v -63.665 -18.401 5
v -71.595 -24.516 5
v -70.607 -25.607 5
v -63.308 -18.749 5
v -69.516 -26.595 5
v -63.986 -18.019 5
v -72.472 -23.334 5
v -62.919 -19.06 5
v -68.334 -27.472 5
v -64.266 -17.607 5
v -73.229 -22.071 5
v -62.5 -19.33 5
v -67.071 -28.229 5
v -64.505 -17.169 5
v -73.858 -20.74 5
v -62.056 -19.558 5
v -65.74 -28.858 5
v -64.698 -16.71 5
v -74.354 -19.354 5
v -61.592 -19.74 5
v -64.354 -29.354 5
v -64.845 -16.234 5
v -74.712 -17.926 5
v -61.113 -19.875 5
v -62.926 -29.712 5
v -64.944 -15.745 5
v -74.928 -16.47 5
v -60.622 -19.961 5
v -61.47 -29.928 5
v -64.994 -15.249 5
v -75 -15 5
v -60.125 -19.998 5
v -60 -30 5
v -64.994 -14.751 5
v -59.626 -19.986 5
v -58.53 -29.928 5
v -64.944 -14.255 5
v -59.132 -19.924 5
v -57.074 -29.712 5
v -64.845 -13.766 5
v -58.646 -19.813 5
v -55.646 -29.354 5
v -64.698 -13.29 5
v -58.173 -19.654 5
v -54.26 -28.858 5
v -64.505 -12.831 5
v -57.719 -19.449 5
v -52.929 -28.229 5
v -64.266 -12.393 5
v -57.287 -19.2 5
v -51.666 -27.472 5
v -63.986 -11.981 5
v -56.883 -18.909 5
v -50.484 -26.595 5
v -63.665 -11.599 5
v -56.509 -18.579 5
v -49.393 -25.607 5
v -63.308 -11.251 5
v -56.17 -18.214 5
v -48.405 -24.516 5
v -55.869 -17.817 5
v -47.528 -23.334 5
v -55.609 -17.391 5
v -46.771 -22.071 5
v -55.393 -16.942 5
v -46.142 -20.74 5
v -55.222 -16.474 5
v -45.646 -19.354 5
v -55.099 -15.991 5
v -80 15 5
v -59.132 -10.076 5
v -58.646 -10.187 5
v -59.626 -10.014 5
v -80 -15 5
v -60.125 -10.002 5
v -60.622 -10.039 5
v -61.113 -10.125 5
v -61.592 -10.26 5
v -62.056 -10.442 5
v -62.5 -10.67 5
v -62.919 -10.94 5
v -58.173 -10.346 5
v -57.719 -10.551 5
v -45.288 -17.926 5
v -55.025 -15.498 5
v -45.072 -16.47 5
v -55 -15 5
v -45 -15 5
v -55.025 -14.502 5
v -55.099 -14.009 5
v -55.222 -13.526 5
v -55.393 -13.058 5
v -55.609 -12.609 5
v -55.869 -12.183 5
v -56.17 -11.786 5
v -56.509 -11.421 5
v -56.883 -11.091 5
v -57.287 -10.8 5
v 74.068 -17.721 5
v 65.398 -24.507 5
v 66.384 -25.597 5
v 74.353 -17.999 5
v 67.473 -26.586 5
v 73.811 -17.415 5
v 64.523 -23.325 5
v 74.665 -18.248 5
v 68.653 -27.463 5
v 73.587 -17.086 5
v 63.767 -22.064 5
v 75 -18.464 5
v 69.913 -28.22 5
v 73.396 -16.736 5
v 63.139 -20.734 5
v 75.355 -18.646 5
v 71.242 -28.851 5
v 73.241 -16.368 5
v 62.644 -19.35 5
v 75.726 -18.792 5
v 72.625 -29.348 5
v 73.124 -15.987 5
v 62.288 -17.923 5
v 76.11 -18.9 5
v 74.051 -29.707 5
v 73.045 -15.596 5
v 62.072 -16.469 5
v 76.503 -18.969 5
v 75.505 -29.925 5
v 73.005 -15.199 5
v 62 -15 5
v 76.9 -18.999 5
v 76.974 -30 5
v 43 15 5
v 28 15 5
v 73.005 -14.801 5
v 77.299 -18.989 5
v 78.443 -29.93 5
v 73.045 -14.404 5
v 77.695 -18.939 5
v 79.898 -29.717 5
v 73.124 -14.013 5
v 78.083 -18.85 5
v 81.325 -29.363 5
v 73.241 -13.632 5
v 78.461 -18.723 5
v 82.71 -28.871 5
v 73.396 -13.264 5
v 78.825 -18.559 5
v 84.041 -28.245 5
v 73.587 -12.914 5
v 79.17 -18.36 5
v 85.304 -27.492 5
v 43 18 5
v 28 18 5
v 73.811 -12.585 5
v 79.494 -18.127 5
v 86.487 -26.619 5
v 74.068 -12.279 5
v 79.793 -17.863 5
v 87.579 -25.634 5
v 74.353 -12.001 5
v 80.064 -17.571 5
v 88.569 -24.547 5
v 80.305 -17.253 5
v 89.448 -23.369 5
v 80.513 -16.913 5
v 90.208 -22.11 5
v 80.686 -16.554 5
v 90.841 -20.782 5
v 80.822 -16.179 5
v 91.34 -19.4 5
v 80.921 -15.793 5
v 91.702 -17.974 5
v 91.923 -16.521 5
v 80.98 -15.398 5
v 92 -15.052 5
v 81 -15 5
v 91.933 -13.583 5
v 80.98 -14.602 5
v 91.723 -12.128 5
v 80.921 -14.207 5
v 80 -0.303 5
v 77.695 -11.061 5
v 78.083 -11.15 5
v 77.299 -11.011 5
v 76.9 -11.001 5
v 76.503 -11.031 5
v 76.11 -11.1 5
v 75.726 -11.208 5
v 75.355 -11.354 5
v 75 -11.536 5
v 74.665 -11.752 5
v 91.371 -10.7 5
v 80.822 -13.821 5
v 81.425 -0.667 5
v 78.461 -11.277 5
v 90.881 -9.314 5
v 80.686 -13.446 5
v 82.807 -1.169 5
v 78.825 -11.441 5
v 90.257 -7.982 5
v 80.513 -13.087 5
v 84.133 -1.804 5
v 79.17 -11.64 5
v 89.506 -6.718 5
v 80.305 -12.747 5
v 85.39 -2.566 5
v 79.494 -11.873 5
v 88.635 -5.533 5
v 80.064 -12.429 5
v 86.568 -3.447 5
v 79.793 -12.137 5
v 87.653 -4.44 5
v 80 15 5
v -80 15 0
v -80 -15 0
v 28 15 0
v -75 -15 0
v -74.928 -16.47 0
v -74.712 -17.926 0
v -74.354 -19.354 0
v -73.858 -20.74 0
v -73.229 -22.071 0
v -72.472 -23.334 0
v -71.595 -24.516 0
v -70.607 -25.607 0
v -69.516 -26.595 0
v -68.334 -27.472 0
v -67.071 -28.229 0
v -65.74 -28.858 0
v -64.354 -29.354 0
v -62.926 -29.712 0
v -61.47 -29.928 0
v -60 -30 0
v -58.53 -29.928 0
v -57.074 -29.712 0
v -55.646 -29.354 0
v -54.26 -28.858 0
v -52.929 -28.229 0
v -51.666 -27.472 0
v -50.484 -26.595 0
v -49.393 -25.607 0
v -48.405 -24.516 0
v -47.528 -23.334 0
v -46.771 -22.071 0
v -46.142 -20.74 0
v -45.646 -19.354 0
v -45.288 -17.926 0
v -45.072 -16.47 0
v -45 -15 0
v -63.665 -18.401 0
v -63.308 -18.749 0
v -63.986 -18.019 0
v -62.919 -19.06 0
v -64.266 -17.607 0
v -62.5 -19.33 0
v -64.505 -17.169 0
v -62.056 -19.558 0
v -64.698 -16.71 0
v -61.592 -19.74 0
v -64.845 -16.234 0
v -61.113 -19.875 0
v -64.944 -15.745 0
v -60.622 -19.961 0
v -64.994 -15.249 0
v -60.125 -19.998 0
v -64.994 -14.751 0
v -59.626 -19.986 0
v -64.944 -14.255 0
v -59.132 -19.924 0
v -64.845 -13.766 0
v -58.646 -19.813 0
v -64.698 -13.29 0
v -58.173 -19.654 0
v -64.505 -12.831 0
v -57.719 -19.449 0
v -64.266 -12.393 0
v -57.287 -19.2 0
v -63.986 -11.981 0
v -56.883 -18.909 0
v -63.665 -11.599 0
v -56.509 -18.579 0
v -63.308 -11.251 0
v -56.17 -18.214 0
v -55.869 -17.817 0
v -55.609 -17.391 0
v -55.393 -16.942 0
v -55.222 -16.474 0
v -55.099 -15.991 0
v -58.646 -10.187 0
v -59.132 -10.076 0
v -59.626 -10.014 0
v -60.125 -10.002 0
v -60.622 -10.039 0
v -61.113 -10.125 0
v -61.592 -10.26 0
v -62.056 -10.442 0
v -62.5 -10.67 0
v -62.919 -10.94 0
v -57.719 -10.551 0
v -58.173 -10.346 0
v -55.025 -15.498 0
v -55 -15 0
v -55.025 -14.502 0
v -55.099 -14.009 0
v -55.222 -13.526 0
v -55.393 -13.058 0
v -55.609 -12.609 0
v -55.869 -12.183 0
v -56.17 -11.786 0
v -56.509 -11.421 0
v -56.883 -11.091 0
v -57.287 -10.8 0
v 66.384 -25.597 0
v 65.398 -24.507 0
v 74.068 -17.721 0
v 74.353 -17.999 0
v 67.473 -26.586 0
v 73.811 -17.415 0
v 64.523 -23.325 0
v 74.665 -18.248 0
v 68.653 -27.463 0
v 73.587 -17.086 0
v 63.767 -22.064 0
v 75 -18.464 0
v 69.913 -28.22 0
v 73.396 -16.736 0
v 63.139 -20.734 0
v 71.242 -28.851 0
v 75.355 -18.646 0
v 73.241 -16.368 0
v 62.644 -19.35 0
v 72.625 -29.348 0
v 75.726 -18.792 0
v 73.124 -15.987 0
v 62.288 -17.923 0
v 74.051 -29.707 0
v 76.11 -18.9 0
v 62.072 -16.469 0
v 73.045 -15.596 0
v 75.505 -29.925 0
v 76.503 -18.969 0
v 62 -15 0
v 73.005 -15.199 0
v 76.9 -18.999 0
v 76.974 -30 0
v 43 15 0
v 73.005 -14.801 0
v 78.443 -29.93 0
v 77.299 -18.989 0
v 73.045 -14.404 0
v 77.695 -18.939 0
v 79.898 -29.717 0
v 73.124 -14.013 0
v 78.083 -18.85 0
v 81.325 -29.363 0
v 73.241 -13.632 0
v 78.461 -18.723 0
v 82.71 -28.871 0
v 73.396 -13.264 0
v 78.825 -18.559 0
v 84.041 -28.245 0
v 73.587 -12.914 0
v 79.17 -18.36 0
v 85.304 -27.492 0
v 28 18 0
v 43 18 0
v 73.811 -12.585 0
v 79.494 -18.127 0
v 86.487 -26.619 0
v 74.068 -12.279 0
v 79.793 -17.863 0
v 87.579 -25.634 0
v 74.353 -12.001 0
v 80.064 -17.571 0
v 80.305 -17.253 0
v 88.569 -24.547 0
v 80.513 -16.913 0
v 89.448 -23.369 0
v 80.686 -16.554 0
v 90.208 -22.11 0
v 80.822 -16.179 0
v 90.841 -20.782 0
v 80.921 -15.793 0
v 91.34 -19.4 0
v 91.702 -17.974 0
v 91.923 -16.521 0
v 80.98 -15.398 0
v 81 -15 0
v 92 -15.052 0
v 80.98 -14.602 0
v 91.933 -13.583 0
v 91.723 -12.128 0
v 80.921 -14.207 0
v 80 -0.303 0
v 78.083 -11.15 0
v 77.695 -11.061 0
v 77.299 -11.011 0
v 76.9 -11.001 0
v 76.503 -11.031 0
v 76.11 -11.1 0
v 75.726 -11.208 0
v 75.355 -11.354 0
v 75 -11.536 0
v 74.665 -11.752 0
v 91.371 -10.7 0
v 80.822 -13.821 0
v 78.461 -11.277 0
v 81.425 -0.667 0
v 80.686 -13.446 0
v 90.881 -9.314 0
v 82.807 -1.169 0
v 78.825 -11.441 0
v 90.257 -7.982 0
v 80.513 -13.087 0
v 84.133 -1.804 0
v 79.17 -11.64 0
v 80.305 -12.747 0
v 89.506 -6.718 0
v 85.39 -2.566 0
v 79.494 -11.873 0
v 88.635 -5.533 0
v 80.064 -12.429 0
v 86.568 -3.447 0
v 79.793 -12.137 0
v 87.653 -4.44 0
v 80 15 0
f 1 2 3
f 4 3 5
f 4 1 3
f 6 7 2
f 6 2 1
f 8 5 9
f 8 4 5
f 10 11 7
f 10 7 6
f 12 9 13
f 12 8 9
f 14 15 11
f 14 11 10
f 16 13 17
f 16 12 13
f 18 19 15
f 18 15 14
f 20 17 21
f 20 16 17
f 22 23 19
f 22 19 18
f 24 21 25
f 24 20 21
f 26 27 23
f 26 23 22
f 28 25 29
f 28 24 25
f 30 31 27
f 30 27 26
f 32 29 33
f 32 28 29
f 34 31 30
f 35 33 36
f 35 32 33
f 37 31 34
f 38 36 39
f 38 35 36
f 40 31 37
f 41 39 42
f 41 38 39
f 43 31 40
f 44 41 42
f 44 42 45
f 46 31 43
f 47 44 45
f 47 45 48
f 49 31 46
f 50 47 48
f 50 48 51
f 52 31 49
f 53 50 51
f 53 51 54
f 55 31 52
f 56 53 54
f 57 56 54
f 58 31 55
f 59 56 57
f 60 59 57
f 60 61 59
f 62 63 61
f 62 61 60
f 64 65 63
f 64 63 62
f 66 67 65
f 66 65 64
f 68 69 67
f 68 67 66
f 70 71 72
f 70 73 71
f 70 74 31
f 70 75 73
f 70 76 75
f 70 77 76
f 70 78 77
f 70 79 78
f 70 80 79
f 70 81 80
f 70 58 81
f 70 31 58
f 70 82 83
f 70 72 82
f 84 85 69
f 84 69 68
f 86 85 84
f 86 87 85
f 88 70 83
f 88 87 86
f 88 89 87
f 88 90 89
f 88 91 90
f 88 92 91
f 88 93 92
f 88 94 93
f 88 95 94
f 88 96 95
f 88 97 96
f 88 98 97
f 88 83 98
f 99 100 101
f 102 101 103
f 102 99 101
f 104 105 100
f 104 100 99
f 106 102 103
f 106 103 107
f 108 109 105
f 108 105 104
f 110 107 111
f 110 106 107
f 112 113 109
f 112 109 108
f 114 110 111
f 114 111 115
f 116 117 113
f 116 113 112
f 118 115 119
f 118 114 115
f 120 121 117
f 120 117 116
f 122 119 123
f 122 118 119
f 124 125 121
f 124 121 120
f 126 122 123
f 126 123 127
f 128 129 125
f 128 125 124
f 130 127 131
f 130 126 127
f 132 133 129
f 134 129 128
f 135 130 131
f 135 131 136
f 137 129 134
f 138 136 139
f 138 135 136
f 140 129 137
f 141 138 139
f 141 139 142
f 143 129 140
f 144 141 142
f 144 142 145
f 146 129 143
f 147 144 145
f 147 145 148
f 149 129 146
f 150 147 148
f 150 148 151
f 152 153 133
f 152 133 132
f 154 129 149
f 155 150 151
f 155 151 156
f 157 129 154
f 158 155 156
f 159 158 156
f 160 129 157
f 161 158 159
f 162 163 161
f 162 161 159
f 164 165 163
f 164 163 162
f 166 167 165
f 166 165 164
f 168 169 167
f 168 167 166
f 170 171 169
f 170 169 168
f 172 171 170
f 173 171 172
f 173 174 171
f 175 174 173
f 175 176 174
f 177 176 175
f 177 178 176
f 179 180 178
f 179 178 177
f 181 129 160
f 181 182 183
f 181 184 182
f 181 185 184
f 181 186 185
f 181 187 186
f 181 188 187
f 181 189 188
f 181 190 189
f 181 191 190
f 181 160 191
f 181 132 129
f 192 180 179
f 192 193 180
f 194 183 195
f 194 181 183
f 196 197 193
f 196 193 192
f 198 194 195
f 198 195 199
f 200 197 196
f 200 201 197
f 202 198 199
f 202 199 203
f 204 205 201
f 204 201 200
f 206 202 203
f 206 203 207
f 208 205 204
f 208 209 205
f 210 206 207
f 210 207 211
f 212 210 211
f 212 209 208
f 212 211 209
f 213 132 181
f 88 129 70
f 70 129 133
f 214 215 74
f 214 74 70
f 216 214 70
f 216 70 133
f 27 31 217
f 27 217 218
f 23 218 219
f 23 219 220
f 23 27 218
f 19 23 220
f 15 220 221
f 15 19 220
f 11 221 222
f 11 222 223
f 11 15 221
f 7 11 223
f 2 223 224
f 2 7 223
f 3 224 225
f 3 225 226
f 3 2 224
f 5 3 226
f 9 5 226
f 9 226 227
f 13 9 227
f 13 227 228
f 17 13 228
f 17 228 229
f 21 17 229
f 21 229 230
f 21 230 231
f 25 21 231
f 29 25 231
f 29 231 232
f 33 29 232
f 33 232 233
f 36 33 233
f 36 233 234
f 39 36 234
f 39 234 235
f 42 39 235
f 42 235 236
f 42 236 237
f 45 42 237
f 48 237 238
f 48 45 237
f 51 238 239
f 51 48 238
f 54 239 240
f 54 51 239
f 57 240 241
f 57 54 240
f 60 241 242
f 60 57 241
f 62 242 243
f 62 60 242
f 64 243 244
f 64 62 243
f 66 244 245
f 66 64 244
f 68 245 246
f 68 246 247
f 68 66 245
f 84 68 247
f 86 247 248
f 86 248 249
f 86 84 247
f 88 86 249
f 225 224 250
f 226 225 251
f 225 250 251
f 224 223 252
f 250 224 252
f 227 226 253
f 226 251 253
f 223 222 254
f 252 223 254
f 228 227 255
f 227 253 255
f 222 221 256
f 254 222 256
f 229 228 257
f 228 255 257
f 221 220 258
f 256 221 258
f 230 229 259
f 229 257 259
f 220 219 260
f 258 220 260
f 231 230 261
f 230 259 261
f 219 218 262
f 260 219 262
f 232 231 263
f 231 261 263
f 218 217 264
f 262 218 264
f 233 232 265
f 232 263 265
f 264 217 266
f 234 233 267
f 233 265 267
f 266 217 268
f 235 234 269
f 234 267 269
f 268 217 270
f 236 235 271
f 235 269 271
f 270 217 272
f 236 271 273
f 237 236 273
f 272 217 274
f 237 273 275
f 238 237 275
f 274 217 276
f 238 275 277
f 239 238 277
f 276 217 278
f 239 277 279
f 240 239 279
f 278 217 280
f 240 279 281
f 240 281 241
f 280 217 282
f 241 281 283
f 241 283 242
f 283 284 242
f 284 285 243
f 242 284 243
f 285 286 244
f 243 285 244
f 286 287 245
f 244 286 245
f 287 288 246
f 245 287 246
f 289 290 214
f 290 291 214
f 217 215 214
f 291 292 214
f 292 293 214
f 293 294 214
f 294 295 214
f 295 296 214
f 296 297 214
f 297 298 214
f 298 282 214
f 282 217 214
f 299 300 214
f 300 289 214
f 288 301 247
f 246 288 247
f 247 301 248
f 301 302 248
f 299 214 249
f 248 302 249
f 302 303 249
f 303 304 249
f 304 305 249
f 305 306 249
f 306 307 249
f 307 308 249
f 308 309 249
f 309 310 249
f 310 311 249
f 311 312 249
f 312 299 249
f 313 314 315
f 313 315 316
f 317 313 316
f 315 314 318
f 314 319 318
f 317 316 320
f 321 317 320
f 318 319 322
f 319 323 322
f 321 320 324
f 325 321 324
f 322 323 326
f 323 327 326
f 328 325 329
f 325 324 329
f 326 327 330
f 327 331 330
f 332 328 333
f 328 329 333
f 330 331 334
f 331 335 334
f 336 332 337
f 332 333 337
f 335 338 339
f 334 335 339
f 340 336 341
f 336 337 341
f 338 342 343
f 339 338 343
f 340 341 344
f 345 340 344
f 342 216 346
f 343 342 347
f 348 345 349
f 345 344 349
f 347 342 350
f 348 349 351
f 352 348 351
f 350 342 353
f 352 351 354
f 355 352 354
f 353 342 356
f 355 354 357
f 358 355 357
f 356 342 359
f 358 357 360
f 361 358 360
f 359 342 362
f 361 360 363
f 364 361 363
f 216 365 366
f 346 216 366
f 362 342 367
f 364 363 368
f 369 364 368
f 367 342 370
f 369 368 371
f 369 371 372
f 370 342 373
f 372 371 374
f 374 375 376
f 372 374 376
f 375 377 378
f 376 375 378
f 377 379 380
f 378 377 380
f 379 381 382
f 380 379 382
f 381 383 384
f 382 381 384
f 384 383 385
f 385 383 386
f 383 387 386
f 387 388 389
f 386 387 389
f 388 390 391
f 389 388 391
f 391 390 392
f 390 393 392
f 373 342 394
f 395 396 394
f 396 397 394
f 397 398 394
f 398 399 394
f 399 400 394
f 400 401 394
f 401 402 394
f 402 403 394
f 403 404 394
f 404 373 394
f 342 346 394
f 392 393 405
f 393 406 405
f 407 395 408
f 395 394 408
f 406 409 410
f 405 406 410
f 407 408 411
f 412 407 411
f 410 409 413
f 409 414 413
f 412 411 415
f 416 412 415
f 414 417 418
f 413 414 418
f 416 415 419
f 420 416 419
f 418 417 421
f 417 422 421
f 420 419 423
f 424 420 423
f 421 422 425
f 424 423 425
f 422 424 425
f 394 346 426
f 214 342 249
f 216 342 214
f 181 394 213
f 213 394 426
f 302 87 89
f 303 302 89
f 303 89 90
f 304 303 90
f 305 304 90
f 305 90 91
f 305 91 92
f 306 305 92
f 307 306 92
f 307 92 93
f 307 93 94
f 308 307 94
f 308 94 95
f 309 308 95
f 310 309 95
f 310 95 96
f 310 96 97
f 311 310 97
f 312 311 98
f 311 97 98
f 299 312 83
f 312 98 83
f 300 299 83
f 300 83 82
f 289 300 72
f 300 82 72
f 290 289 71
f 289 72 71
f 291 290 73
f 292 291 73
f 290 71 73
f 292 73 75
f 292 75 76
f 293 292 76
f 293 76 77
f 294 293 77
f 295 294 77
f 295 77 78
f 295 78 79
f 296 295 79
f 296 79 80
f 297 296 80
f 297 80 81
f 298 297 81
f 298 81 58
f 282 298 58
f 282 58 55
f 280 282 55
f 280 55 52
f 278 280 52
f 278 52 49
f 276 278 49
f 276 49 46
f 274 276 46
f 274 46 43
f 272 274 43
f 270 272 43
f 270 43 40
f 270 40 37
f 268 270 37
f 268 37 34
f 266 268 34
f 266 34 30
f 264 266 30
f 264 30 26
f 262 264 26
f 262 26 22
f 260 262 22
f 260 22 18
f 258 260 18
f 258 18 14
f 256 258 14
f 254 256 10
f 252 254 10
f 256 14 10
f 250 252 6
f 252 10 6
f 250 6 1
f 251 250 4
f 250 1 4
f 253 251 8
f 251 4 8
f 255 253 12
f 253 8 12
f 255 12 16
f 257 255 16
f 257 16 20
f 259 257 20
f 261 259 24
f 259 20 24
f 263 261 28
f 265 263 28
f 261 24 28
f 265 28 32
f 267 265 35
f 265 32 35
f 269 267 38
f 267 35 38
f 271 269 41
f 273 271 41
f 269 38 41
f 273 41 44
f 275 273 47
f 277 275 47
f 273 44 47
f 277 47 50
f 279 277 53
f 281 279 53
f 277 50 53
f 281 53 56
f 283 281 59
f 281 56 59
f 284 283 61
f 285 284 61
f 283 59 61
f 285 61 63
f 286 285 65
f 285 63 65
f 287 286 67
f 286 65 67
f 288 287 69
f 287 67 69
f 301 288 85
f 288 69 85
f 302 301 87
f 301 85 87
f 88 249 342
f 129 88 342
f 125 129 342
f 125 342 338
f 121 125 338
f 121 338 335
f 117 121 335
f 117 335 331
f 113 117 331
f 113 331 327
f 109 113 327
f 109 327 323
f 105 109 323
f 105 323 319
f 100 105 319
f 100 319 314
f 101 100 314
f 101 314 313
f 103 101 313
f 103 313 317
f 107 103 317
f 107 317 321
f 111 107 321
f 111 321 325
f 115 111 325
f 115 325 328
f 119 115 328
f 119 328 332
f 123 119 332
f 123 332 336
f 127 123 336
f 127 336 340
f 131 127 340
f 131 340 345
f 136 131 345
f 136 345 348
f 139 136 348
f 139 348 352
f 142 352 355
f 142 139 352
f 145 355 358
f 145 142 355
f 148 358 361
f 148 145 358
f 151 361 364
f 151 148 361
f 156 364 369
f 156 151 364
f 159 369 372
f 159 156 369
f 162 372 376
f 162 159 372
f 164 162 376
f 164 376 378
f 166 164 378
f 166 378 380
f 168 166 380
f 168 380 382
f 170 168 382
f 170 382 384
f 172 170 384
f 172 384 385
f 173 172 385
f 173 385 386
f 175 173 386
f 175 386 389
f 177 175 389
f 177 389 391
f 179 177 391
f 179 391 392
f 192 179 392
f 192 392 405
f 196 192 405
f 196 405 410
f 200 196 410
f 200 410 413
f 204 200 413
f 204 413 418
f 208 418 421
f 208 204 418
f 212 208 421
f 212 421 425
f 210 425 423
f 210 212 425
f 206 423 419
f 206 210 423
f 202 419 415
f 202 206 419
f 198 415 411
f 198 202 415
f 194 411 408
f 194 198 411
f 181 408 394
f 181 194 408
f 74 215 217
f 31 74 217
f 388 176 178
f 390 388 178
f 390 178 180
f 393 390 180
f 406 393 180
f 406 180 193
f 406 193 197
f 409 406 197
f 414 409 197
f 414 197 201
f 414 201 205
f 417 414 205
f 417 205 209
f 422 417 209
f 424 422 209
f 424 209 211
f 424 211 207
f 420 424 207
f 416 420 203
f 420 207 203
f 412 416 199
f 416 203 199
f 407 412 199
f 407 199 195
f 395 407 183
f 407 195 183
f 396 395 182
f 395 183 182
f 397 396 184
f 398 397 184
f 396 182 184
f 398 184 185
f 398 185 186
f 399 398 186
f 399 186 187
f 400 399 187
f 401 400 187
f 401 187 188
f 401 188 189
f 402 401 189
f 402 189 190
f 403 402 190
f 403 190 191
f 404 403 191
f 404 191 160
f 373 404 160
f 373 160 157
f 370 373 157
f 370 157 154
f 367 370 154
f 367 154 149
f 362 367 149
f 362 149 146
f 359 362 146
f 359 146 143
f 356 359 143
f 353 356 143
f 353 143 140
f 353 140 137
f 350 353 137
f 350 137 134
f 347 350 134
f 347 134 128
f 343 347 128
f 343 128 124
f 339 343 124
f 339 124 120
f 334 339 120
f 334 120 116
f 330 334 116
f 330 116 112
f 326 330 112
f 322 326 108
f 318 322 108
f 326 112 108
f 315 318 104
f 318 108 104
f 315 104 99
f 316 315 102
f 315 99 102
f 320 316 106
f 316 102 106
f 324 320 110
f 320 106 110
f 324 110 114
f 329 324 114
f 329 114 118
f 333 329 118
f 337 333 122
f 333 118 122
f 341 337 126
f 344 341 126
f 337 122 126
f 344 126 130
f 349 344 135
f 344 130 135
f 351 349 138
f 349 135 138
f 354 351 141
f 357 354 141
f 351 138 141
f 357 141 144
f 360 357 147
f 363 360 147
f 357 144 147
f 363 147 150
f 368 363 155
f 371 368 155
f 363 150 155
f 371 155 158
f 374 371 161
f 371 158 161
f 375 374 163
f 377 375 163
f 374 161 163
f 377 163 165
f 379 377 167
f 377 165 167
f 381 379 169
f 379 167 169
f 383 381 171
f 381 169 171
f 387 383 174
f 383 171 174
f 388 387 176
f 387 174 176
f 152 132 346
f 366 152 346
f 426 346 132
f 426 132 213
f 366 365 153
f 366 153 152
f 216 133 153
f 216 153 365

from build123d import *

# Parameters (mm, degrees)
SKETCH_1_W          = 160
SKETCH_1_H          = 30
EXTRUDE_1_DEPTH     = 5
SKETCH_2_R          = 15
EXTRUDE_2_DEPTH     = 5
SKETCH_3_R          = 5
SKETCH_3_R_2        = 4
CUT_EXTRUDE_1_DEPTH = 6
SKETCH_4_W          = 15
SKETCH_4_H          = 5
EXTRUDE_3_DEPTH     = 3


with BuildPart() as part:
    # 草图1 → 凸台-拉伸1 (new body)
    with BuildSketch(Plane.XY):
        Rectangle(SKETCH_1_W, SKETCH_1_H)
    extrude(amount=EXTRUDE_1_DEPTH)

    # 草图2 → 凸台-拉伸2 (add)
    with BuildSketch(Plane.XY.offset(5)):
        with Locations((-60, -15)):
            Circle(SKETCH_2_R)
        with Locations((77, -15)):
            Circle(SKETCH_2_R)
    extrude(amount=-EXTRUDE_2_DEPTH)

    # 草图3 → 切除-拉伸1 (cut, through all)
    with BuildSketch(Plane.XY.offset(5)):
        with Locations((-60, -15)):
            Circle(SKETCH_3_R)
        with Locations((77, -15)):
            Circle(SKETCH_3_R_2)
    extrude(amount=-CUT_EXTRUDE_1_DEPTH, mode=Mode.SUBTRACT)

    # 草图4 → 凸台-拉伸3 (add)
    with BuildSketch(Plane(origin=(0, 15, 0), x_dir=(1, 0, 0), z_dir=(0, 1, 0))):
        with Locations((35.5, -2.5)):
            Rectangle(SKETCH_4_W, SKETCH_4_H)
    extrude(amount=EXTRUDE_3_DEPTH)


solid = part.part
